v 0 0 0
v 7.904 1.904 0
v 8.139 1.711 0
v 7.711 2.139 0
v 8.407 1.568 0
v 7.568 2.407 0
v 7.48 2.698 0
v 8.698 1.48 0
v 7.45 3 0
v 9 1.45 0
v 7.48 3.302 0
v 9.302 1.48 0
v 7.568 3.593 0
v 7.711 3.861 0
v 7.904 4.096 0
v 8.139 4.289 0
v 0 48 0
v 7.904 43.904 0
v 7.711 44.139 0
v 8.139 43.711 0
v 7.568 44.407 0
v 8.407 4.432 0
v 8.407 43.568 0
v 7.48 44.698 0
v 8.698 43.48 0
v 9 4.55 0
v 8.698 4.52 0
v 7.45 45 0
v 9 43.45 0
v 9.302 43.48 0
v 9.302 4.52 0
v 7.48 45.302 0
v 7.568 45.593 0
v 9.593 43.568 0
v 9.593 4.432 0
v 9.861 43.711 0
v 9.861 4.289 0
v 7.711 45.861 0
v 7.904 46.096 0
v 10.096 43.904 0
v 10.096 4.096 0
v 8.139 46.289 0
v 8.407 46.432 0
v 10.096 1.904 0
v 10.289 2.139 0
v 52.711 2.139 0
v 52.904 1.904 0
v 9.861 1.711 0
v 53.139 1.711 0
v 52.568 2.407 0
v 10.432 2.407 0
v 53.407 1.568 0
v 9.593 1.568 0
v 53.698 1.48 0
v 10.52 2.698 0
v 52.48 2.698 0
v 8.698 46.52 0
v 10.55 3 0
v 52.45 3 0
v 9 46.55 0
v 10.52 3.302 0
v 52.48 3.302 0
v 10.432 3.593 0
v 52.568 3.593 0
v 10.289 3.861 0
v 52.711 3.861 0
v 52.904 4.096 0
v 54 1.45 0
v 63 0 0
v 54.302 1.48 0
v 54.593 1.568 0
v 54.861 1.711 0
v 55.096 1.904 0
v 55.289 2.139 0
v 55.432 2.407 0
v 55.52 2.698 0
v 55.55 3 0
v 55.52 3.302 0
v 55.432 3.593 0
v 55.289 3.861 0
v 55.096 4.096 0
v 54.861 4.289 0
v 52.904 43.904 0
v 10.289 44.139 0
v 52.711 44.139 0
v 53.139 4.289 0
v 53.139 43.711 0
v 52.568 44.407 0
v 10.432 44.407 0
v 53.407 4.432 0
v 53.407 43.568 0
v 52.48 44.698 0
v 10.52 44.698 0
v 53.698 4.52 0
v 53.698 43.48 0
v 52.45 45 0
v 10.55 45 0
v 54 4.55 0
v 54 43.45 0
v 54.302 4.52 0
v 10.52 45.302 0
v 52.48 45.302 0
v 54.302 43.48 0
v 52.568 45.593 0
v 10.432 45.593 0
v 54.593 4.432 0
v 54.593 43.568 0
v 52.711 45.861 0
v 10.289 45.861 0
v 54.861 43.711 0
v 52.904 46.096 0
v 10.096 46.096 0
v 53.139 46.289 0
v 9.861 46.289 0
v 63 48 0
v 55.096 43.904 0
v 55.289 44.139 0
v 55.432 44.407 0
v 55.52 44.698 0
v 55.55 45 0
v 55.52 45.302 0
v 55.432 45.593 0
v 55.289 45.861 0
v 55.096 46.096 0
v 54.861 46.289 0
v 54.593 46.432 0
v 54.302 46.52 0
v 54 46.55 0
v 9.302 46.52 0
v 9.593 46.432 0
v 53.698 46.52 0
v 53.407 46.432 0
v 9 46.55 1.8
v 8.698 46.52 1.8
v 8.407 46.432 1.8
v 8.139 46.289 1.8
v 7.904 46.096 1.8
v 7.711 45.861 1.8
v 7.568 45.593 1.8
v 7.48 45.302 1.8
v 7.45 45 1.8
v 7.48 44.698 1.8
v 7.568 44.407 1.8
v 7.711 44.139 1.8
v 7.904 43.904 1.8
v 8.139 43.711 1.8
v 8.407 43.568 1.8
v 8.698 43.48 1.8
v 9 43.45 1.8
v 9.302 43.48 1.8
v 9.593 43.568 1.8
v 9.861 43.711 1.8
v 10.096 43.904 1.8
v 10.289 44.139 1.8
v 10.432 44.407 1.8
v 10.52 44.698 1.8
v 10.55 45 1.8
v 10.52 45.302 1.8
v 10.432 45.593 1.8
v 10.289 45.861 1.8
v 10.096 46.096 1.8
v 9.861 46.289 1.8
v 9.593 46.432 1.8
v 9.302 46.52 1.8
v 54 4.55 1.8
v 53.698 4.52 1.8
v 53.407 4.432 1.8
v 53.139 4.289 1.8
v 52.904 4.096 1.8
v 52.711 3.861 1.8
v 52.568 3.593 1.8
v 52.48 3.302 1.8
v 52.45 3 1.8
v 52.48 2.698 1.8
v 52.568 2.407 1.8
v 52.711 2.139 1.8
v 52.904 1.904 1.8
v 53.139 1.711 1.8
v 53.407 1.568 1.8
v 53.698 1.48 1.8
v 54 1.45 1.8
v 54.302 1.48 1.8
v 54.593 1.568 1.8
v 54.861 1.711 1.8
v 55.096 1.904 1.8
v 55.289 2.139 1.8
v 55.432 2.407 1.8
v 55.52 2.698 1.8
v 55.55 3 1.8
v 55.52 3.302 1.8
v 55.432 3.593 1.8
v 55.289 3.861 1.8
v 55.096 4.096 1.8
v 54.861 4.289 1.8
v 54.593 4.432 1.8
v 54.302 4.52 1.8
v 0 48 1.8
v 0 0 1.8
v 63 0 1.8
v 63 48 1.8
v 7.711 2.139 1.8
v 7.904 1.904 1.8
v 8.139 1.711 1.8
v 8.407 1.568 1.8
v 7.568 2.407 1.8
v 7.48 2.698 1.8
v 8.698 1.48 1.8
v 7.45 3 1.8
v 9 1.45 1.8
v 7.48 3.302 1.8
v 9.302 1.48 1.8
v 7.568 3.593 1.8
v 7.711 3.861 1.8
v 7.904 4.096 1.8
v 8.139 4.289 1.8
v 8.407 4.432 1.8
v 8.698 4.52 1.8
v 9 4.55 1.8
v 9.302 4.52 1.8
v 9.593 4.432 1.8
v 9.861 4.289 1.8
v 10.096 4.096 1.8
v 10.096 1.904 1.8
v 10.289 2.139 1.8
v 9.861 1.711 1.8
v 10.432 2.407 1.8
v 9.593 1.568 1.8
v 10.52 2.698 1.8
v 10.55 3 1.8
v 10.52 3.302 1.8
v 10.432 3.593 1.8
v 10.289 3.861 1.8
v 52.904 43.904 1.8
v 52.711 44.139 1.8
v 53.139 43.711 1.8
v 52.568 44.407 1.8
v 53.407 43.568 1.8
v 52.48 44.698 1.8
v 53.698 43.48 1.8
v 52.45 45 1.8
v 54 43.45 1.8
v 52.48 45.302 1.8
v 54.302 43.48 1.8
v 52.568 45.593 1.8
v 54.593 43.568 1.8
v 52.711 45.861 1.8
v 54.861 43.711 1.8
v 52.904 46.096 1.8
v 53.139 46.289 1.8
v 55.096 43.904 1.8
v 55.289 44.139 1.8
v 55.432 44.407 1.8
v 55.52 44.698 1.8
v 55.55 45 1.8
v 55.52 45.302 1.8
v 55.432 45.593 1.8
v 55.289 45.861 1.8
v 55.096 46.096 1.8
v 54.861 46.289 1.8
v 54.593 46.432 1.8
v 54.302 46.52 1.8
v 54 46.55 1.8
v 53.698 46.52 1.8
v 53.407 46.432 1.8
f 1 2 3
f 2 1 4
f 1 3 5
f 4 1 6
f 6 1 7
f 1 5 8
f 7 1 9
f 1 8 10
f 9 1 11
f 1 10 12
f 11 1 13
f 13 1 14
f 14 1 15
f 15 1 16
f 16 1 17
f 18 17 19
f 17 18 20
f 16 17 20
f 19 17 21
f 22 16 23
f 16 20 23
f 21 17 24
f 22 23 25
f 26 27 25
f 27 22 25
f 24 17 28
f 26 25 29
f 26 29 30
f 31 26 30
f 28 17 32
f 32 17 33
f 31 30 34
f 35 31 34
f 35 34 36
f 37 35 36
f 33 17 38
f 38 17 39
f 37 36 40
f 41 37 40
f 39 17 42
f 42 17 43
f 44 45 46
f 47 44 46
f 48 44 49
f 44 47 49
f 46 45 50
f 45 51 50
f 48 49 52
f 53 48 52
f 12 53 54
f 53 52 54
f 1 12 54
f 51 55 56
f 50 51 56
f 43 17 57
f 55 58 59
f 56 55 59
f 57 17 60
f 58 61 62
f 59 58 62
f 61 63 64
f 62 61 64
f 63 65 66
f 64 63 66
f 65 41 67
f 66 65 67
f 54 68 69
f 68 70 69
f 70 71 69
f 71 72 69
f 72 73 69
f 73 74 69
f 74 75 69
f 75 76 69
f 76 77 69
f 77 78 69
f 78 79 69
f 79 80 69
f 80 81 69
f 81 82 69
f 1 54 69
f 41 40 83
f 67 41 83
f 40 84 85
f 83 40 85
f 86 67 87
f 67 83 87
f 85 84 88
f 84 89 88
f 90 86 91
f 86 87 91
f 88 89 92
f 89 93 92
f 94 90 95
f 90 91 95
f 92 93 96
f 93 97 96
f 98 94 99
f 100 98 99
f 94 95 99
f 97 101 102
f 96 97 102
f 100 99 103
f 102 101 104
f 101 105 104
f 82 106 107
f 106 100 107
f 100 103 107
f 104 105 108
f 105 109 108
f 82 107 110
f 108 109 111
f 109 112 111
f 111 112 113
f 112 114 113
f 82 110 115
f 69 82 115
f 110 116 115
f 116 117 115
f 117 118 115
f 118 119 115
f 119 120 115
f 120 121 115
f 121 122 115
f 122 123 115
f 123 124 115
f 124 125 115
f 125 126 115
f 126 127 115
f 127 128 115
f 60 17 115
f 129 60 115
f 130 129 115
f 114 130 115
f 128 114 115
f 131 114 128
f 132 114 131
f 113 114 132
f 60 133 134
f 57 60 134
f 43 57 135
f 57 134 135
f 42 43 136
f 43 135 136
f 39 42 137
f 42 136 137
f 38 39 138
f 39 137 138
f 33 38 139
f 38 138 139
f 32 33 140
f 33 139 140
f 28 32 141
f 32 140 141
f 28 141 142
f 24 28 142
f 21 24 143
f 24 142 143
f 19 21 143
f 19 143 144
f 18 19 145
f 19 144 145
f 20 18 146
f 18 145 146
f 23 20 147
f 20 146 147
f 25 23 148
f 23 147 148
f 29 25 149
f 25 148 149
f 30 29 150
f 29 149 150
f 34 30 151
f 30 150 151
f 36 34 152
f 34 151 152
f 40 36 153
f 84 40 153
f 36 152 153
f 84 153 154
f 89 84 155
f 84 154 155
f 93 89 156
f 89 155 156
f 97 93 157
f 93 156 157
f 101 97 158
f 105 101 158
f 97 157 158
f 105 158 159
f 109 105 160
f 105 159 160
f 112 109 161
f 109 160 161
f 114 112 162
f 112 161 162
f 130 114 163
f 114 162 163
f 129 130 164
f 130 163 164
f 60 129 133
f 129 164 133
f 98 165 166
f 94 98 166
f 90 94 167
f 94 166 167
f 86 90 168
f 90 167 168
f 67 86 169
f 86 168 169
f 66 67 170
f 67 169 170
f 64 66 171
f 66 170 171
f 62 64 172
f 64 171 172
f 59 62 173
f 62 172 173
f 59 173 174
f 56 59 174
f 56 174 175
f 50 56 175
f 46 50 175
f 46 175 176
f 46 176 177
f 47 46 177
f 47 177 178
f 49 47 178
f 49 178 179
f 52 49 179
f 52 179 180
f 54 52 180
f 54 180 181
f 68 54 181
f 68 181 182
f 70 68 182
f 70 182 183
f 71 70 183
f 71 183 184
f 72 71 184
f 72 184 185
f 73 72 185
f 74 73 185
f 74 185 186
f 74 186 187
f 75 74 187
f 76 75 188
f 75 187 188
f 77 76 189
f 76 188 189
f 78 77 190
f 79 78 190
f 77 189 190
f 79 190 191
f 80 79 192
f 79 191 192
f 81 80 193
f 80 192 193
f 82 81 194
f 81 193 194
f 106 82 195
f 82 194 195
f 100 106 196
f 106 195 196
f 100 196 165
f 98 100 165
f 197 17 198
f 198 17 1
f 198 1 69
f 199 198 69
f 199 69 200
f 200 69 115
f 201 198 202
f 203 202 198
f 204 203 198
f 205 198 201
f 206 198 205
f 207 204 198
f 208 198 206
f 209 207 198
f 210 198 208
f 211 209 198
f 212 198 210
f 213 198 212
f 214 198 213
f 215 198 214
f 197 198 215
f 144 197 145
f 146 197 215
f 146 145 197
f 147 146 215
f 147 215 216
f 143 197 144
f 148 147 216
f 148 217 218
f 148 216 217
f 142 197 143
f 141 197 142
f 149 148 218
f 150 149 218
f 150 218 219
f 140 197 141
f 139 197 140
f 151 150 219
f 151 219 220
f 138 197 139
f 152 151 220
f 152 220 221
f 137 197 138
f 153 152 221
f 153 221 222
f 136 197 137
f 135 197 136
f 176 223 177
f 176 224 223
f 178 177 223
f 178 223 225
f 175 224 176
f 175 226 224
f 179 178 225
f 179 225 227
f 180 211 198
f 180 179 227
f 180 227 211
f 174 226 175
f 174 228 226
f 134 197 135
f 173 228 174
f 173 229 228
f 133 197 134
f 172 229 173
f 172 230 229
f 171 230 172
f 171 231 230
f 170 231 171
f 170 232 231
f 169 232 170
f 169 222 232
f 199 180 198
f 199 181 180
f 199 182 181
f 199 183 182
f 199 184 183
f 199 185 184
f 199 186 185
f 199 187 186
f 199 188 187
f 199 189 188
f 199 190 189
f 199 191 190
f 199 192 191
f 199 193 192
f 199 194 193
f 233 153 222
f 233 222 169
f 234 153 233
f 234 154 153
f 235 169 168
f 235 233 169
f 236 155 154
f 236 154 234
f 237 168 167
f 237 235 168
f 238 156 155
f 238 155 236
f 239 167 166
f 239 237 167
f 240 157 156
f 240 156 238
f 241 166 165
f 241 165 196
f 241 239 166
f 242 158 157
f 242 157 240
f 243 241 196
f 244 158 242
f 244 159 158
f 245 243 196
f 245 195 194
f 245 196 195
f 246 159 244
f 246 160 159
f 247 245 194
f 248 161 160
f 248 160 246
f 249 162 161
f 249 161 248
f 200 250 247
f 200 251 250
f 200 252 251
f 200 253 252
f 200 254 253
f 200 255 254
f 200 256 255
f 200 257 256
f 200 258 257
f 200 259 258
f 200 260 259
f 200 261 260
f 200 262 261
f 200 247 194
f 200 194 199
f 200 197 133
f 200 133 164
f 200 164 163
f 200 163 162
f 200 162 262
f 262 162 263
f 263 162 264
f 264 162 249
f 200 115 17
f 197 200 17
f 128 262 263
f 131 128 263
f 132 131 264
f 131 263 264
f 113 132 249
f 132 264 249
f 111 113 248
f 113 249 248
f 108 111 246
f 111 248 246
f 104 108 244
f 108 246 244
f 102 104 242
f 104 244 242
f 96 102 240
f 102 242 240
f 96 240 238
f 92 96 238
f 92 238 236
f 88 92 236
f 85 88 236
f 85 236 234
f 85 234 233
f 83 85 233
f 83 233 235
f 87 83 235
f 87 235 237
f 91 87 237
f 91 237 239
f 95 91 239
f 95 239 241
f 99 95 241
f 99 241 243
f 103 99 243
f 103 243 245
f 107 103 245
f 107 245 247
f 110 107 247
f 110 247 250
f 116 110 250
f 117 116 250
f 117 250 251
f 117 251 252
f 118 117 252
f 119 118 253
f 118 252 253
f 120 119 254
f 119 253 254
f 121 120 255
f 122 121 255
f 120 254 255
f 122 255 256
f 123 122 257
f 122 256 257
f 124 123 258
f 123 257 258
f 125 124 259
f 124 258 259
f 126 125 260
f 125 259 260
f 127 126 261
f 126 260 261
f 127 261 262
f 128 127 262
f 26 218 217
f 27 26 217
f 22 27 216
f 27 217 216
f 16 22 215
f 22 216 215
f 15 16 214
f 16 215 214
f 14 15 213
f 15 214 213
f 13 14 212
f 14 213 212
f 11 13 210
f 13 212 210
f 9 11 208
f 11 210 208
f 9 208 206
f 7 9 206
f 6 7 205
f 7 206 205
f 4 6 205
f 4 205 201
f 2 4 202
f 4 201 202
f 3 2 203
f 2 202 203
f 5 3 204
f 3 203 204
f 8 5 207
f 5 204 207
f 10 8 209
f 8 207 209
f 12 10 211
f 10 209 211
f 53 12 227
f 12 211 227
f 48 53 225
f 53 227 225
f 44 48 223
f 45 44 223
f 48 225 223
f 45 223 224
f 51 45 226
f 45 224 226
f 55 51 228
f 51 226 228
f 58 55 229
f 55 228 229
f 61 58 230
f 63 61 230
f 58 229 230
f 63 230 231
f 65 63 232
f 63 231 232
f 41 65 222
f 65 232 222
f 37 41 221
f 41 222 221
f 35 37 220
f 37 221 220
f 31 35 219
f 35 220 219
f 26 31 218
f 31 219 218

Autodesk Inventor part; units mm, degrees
ref_plane "YZ Plane" through (0, 0, 0) normal (1, 0, 0) x (0, 1, 0)
ref_plane "XZ Plane" through (0, 0, 0) normal (0, 1, 0) x (-1, 0, 0)
ref_plane "XY Plane" through (0, 0, 0) normal (0, 0, 1) x (1, 0, 0)
sketch "Sketch1" plane through (0, 0, 0) normal (0, 0, 1) x (1, 0, 0)
  line L0 (0, 0) -> (63, 0)
  line L1 (63, 0) -> (63, 48)
  line L2 (63, 48) -> (0, 48)
  line L3 (0, 48) -> (0, 0)
  line L4 (9, 45) -> (54, 45) construction
  line L5 (54, 45) -> (54, 3) construction
  line L6 (54, 3) -> (9, 3) construction
  line L7 (9, 3) -> (9, 45) construction
  dimension "d0" = 63
  dimension "d1" = 48
  dimension "d2" = 45
  dimension "d3" = 42
  dimension "d4" = 3
  dimension "d5" = 9
  dimension "d6" = 9
  dimension "d7" = 3
extrude "Extrusion1" add sketch "Sketch1" along normal blind 1.8
hole "Hole1" at (9, 45, 0) at (54, 45, 0) at (9, 3, 0) at (54, 3, 0) direction (0, 0, 1) diameter 3.1 end through all
properties part number "Mechanical Driver Board"
